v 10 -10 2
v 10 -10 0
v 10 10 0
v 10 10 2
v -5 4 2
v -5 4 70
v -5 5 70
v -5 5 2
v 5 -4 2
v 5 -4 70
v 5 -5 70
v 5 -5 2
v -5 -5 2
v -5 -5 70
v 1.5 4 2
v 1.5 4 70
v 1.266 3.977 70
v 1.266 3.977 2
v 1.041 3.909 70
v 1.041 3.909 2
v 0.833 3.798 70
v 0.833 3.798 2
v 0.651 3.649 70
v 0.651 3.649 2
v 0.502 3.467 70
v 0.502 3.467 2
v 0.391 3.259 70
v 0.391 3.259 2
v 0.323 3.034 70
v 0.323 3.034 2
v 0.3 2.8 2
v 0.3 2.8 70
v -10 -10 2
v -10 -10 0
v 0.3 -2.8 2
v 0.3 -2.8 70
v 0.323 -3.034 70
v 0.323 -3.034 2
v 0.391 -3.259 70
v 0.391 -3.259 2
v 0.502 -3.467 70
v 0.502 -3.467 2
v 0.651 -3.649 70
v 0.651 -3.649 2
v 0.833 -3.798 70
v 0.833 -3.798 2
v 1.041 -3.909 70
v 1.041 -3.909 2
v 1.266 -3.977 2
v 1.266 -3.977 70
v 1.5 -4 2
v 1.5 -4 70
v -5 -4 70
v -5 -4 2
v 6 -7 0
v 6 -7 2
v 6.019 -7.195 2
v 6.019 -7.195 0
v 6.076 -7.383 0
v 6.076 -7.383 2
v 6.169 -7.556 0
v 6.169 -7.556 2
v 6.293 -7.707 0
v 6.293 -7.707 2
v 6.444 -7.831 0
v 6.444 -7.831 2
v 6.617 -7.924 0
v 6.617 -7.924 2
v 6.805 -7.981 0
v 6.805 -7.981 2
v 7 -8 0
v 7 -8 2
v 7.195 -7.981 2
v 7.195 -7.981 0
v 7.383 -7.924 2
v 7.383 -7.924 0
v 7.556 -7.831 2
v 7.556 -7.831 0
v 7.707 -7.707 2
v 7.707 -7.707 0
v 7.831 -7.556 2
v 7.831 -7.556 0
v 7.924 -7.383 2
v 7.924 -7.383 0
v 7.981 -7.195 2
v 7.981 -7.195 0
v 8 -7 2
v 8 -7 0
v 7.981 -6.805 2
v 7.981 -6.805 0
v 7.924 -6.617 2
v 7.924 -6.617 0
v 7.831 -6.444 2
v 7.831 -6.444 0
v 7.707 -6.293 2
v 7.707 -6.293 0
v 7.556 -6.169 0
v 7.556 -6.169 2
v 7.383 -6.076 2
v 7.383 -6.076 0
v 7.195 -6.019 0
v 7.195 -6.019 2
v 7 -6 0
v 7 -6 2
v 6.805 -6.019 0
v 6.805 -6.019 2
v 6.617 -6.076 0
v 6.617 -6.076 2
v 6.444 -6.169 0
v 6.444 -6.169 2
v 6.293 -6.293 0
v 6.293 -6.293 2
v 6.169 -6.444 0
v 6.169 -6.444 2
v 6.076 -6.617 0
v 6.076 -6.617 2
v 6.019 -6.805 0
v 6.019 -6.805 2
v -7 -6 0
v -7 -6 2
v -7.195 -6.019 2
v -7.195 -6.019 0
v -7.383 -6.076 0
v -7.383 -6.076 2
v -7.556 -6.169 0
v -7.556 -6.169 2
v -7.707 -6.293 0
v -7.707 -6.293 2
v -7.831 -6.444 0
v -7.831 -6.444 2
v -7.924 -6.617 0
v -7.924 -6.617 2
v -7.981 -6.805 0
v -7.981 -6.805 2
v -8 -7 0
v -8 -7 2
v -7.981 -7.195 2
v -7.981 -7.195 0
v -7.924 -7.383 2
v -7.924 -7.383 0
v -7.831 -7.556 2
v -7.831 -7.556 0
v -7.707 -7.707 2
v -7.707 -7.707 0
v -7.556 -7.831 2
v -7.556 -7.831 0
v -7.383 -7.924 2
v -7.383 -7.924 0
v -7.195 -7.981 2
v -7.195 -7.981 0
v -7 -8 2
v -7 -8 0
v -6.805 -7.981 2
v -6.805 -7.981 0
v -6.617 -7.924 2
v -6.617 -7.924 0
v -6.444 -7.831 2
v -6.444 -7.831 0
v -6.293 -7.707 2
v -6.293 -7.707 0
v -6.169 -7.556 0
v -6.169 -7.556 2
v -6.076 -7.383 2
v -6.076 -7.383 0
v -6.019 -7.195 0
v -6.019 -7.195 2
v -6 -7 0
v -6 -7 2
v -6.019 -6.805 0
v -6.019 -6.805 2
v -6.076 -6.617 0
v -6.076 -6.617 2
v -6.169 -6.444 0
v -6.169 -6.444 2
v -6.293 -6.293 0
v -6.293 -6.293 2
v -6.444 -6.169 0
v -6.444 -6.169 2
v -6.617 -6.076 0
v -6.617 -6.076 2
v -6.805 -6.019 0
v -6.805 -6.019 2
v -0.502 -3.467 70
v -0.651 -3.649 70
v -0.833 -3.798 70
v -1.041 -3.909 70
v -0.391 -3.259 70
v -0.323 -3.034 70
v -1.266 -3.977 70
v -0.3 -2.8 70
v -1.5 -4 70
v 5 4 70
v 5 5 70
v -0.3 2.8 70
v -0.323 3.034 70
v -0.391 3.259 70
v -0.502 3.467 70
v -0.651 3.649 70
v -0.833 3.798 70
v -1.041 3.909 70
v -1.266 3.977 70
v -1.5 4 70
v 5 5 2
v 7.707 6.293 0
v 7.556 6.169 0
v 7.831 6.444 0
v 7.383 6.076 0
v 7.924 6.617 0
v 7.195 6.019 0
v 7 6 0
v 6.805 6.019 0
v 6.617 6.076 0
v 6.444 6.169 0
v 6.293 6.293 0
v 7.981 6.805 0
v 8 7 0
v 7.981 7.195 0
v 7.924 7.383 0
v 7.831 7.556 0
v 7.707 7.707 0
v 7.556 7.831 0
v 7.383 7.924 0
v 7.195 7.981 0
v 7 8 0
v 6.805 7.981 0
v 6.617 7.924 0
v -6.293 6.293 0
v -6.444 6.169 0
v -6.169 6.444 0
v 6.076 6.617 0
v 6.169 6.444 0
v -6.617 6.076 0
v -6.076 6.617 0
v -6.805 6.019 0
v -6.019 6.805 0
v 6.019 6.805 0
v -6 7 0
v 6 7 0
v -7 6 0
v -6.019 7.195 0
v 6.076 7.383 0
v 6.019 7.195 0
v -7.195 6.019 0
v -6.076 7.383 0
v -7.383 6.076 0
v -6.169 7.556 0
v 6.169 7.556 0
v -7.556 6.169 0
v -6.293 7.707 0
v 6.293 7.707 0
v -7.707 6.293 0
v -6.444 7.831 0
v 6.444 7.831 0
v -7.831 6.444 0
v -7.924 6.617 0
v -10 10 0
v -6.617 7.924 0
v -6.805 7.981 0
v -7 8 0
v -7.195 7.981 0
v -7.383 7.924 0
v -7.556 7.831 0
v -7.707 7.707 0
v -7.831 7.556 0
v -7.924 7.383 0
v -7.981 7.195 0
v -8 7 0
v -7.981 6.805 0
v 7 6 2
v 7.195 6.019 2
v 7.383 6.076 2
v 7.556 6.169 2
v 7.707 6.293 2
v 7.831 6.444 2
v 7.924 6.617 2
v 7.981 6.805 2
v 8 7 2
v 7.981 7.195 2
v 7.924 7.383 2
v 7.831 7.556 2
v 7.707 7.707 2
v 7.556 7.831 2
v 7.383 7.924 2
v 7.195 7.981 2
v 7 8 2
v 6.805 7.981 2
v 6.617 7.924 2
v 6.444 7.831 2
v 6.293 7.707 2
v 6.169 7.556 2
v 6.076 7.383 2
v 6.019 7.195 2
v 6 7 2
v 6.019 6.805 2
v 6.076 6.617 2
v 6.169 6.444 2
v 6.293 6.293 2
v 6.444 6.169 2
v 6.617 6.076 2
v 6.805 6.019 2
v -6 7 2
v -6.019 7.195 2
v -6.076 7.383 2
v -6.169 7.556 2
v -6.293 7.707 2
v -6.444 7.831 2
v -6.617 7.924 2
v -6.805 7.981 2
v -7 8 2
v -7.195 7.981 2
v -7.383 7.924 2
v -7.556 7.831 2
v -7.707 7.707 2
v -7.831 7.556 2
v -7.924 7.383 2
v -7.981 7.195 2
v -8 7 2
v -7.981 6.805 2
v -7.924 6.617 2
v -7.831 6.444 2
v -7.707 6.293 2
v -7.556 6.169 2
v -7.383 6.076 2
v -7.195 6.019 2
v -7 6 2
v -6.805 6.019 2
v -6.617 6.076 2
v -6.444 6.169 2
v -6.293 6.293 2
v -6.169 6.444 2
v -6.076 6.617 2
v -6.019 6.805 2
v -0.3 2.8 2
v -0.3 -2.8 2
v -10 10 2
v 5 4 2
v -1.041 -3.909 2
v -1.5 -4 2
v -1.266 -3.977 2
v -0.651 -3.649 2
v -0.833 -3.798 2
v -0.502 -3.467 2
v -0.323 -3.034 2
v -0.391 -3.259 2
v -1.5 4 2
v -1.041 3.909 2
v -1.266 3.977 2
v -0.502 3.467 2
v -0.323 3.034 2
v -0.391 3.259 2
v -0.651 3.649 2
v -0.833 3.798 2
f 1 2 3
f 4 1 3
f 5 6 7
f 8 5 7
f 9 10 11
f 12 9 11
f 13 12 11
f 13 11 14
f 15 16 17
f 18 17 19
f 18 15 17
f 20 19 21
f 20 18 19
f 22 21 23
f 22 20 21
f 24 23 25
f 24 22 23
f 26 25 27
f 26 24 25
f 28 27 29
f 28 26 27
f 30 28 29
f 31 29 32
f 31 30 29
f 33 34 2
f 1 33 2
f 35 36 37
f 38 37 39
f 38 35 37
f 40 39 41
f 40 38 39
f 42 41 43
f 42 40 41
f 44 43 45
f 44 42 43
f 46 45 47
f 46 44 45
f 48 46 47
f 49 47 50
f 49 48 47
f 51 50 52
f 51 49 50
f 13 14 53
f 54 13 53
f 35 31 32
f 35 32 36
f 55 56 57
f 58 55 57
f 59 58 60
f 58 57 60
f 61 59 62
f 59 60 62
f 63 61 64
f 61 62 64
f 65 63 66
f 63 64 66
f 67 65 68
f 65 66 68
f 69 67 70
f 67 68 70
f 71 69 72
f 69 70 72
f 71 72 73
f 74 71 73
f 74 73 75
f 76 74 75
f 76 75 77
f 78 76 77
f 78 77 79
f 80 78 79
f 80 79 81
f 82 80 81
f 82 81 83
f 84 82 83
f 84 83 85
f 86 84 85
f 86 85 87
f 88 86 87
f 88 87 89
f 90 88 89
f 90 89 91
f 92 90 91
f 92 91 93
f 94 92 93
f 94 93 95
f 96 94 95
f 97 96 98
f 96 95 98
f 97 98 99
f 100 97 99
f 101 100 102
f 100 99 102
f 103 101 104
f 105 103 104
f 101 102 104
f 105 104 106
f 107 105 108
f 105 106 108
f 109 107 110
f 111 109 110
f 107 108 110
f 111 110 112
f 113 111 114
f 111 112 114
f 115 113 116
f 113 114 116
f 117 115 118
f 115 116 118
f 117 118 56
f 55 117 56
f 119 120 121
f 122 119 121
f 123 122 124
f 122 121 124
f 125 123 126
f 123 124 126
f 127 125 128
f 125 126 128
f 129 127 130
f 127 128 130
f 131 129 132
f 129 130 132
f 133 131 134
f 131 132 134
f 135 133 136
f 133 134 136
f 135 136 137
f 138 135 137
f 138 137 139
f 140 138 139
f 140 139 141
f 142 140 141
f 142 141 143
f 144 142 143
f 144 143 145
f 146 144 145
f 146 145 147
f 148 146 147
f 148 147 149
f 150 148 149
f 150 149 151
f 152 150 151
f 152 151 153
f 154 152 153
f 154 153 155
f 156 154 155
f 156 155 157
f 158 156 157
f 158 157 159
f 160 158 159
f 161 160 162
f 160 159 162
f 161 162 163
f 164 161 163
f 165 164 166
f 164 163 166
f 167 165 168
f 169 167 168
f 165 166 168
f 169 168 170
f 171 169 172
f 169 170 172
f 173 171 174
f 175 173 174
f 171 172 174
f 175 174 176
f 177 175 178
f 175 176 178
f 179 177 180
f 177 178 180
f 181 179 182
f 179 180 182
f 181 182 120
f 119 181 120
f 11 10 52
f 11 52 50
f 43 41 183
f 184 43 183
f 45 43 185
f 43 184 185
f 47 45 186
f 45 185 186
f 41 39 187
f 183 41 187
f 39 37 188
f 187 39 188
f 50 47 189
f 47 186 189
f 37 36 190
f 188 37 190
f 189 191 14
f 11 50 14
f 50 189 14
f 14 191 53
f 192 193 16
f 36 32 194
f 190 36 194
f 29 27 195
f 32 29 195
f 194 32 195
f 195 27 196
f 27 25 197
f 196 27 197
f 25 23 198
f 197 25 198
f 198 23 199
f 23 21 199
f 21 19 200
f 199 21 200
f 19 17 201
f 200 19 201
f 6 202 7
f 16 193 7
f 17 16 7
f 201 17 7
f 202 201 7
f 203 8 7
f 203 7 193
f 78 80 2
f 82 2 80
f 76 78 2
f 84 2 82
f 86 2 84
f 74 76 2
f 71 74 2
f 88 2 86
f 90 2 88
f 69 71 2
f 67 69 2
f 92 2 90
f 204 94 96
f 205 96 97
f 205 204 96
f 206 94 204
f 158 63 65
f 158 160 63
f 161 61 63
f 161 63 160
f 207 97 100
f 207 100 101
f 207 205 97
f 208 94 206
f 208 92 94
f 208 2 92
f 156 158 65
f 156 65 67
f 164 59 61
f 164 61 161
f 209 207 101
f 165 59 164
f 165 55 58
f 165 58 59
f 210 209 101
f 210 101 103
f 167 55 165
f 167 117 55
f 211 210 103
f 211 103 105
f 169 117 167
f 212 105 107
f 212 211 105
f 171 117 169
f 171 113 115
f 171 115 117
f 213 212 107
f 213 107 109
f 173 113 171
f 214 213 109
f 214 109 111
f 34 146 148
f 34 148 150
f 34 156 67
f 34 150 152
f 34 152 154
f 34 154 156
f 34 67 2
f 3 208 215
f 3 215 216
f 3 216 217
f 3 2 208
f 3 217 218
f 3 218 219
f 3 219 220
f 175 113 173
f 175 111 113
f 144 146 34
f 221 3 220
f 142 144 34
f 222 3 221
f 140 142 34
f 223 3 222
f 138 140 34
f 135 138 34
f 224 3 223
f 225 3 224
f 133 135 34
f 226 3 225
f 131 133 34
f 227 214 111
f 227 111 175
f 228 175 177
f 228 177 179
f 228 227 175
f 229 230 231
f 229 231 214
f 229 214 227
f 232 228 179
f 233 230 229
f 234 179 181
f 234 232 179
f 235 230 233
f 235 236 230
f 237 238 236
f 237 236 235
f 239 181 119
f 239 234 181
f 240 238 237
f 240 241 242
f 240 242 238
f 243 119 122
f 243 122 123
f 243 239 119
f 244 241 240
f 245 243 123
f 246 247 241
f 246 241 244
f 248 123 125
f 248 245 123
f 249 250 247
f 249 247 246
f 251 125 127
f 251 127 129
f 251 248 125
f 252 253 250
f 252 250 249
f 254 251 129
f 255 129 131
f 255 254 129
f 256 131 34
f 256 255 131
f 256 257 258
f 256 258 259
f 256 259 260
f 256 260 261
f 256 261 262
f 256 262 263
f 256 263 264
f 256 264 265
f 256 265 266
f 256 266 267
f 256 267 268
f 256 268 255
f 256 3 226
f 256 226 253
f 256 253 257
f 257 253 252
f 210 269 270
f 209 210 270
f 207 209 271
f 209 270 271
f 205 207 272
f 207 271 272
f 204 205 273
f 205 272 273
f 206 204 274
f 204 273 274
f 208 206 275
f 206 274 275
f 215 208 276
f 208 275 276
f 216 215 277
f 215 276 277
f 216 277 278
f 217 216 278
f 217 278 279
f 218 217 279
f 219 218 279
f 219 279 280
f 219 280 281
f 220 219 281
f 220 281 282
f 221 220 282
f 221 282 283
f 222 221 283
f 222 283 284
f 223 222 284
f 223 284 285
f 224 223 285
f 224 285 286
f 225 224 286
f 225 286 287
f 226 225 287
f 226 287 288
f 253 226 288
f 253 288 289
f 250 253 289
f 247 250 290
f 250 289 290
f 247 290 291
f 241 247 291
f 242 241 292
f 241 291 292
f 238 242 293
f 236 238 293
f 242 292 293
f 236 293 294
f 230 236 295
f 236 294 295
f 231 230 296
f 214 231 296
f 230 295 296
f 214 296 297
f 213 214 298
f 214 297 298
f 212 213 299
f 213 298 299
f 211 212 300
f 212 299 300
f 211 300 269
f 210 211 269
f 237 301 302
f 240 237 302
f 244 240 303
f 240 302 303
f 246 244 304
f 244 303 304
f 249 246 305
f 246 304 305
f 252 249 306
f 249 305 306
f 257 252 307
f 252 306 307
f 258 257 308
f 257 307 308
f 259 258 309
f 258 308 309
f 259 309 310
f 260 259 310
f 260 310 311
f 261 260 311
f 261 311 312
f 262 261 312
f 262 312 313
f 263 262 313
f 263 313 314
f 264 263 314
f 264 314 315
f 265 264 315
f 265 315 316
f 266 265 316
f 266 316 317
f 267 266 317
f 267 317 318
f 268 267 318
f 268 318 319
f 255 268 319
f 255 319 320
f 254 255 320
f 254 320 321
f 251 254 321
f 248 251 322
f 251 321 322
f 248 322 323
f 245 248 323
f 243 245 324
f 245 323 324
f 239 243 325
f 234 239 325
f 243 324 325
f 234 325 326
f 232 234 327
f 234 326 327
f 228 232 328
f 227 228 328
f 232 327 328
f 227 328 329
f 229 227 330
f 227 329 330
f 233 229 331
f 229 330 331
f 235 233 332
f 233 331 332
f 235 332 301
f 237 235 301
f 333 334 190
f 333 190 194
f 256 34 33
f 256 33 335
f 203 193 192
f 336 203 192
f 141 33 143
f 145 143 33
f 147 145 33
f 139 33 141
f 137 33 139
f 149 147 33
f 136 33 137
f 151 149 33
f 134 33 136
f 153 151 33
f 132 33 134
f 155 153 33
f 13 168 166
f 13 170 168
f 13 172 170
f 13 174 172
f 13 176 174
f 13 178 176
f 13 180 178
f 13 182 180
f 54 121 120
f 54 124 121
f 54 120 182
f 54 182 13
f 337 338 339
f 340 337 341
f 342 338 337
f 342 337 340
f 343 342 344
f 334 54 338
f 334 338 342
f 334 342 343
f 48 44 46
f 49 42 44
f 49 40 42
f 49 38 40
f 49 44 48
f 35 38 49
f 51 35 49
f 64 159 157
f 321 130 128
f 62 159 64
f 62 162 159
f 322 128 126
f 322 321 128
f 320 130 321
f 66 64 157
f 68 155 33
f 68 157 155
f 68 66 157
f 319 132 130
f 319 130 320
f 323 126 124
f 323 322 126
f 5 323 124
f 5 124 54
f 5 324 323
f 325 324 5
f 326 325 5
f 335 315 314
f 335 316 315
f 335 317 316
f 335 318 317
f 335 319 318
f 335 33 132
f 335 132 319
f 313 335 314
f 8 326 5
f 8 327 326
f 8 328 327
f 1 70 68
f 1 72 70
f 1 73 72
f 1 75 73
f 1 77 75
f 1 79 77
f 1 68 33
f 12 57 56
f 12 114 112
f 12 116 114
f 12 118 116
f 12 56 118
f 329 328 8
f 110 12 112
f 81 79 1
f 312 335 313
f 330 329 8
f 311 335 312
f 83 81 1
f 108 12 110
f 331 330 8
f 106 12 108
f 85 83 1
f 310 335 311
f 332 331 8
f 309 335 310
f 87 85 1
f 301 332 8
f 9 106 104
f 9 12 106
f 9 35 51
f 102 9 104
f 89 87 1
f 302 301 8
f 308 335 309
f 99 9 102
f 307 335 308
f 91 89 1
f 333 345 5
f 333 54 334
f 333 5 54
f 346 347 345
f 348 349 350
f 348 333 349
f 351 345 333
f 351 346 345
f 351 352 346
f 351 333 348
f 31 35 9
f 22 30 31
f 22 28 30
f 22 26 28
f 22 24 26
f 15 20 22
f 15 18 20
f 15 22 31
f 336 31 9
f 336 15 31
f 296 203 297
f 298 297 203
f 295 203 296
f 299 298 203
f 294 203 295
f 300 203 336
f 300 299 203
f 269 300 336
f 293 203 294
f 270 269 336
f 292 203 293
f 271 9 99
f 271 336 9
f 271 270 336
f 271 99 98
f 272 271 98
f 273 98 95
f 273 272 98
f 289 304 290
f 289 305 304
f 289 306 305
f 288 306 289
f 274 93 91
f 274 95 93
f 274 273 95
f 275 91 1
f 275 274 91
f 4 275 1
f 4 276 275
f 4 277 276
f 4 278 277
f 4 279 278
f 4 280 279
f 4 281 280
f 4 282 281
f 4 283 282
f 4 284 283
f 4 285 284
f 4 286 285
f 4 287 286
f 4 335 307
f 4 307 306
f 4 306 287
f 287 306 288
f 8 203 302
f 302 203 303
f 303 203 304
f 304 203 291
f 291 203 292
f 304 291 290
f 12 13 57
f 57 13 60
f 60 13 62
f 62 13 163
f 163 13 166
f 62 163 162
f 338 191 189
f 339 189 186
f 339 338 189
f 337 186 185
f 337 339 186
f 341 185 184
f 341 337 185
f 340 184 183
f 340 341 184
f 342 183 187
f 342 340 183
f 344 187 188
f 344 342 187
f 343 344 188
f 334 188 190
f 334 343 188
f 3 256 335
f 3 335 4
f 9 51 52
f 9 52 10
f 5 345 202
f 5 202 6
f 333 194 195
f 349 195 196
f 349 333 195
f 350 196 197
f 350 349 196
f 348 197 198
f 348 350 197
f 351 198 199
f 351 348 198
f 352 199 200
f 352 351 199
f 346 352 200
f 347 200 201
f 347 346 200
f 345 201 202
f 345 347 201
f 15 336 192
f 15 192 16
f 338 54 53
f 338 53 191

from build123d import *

# Parameters (mm, degrees)
PAD_DEPTH          = 70
SKETCH002_W        = 20
SKETCH002_H        = 20
PAD001_DEPTH       = 2
SKETCH003_R        = 1
POCKET_DEPTH       = 5
POLARPATTERN_COUNT = 4


with BuildPart() as pad:
    # Sketch001 → Pad (new body)
    with BuildSketch(Plane.XY):
        with BuildLine():
            Line((-5, 4), (-5, 5))
            Line((-5, 5), (5, 5))
            Line((5, 5), (5, 4))
            Line((5, 4), (1.5, 4))
            ThreePointArc((1.5, 4), (0.651472, 3.648528), (0.3, 2.8))
            Line((0.3, 2.8), (0.3, -2.8))
            ThreePointArc((0.3, -2.8), (0.651472, -3.648528), (1.5, -4))
            Line((1.5, -4), (5, -4))
            Line((5, -4), (5, -5))
            Line((5, -5), (-5, -5))
            Line((-5, -5), (-5, -4))
            Line((-5, -4), (-1.5, -4))
            ThreePointArc((-1.5, -4), (-0.651472, -3.648528), (-0.3, -2.8))
            Line((-0.3, -2.8), (-0.3, 2.8))
            ThreePointArc((-0.3, 2.8), (-0.651472, 3.648528), (-1.5, 4))
            Line((-1.5, 4), (-5, 4))
        make_face()
    extrude(amount=PAD_DEPTH)


with BuildPart() as fusion:
    # Sketch002 → Pad001 (new body)
    with BuildSketch(Plane.XY):
        Rectangle(SKETCH002_W, SKETCH002_H)
    extrude(amount=PAD001_DEPTH)

    # Sketch003 → Pocket (cut)
    with BuildSketch(Plane.XY.offset(2)):
        with Locations((-7, 7)):
            Circle(SKETCH003_R)
    pocket = extrude(amount=-POCKET_DEPTH, mode=Mode.SUBTRACT)

    # PolarPattern: Pocket ×4 about axis
    polarpattern_axis = Axis((0, 0, 2), (0, 0, 1))
    for i in range(1, POLARPATTERN_COUNT):
        add(pocket.rotate(polarpattern_axis, i * 360 / POLARPATTERN_COUNT), mode=Mode.SUBTRACT)

    # Fusion: union Pad
    add(pad.part)


solid = fusion.part
